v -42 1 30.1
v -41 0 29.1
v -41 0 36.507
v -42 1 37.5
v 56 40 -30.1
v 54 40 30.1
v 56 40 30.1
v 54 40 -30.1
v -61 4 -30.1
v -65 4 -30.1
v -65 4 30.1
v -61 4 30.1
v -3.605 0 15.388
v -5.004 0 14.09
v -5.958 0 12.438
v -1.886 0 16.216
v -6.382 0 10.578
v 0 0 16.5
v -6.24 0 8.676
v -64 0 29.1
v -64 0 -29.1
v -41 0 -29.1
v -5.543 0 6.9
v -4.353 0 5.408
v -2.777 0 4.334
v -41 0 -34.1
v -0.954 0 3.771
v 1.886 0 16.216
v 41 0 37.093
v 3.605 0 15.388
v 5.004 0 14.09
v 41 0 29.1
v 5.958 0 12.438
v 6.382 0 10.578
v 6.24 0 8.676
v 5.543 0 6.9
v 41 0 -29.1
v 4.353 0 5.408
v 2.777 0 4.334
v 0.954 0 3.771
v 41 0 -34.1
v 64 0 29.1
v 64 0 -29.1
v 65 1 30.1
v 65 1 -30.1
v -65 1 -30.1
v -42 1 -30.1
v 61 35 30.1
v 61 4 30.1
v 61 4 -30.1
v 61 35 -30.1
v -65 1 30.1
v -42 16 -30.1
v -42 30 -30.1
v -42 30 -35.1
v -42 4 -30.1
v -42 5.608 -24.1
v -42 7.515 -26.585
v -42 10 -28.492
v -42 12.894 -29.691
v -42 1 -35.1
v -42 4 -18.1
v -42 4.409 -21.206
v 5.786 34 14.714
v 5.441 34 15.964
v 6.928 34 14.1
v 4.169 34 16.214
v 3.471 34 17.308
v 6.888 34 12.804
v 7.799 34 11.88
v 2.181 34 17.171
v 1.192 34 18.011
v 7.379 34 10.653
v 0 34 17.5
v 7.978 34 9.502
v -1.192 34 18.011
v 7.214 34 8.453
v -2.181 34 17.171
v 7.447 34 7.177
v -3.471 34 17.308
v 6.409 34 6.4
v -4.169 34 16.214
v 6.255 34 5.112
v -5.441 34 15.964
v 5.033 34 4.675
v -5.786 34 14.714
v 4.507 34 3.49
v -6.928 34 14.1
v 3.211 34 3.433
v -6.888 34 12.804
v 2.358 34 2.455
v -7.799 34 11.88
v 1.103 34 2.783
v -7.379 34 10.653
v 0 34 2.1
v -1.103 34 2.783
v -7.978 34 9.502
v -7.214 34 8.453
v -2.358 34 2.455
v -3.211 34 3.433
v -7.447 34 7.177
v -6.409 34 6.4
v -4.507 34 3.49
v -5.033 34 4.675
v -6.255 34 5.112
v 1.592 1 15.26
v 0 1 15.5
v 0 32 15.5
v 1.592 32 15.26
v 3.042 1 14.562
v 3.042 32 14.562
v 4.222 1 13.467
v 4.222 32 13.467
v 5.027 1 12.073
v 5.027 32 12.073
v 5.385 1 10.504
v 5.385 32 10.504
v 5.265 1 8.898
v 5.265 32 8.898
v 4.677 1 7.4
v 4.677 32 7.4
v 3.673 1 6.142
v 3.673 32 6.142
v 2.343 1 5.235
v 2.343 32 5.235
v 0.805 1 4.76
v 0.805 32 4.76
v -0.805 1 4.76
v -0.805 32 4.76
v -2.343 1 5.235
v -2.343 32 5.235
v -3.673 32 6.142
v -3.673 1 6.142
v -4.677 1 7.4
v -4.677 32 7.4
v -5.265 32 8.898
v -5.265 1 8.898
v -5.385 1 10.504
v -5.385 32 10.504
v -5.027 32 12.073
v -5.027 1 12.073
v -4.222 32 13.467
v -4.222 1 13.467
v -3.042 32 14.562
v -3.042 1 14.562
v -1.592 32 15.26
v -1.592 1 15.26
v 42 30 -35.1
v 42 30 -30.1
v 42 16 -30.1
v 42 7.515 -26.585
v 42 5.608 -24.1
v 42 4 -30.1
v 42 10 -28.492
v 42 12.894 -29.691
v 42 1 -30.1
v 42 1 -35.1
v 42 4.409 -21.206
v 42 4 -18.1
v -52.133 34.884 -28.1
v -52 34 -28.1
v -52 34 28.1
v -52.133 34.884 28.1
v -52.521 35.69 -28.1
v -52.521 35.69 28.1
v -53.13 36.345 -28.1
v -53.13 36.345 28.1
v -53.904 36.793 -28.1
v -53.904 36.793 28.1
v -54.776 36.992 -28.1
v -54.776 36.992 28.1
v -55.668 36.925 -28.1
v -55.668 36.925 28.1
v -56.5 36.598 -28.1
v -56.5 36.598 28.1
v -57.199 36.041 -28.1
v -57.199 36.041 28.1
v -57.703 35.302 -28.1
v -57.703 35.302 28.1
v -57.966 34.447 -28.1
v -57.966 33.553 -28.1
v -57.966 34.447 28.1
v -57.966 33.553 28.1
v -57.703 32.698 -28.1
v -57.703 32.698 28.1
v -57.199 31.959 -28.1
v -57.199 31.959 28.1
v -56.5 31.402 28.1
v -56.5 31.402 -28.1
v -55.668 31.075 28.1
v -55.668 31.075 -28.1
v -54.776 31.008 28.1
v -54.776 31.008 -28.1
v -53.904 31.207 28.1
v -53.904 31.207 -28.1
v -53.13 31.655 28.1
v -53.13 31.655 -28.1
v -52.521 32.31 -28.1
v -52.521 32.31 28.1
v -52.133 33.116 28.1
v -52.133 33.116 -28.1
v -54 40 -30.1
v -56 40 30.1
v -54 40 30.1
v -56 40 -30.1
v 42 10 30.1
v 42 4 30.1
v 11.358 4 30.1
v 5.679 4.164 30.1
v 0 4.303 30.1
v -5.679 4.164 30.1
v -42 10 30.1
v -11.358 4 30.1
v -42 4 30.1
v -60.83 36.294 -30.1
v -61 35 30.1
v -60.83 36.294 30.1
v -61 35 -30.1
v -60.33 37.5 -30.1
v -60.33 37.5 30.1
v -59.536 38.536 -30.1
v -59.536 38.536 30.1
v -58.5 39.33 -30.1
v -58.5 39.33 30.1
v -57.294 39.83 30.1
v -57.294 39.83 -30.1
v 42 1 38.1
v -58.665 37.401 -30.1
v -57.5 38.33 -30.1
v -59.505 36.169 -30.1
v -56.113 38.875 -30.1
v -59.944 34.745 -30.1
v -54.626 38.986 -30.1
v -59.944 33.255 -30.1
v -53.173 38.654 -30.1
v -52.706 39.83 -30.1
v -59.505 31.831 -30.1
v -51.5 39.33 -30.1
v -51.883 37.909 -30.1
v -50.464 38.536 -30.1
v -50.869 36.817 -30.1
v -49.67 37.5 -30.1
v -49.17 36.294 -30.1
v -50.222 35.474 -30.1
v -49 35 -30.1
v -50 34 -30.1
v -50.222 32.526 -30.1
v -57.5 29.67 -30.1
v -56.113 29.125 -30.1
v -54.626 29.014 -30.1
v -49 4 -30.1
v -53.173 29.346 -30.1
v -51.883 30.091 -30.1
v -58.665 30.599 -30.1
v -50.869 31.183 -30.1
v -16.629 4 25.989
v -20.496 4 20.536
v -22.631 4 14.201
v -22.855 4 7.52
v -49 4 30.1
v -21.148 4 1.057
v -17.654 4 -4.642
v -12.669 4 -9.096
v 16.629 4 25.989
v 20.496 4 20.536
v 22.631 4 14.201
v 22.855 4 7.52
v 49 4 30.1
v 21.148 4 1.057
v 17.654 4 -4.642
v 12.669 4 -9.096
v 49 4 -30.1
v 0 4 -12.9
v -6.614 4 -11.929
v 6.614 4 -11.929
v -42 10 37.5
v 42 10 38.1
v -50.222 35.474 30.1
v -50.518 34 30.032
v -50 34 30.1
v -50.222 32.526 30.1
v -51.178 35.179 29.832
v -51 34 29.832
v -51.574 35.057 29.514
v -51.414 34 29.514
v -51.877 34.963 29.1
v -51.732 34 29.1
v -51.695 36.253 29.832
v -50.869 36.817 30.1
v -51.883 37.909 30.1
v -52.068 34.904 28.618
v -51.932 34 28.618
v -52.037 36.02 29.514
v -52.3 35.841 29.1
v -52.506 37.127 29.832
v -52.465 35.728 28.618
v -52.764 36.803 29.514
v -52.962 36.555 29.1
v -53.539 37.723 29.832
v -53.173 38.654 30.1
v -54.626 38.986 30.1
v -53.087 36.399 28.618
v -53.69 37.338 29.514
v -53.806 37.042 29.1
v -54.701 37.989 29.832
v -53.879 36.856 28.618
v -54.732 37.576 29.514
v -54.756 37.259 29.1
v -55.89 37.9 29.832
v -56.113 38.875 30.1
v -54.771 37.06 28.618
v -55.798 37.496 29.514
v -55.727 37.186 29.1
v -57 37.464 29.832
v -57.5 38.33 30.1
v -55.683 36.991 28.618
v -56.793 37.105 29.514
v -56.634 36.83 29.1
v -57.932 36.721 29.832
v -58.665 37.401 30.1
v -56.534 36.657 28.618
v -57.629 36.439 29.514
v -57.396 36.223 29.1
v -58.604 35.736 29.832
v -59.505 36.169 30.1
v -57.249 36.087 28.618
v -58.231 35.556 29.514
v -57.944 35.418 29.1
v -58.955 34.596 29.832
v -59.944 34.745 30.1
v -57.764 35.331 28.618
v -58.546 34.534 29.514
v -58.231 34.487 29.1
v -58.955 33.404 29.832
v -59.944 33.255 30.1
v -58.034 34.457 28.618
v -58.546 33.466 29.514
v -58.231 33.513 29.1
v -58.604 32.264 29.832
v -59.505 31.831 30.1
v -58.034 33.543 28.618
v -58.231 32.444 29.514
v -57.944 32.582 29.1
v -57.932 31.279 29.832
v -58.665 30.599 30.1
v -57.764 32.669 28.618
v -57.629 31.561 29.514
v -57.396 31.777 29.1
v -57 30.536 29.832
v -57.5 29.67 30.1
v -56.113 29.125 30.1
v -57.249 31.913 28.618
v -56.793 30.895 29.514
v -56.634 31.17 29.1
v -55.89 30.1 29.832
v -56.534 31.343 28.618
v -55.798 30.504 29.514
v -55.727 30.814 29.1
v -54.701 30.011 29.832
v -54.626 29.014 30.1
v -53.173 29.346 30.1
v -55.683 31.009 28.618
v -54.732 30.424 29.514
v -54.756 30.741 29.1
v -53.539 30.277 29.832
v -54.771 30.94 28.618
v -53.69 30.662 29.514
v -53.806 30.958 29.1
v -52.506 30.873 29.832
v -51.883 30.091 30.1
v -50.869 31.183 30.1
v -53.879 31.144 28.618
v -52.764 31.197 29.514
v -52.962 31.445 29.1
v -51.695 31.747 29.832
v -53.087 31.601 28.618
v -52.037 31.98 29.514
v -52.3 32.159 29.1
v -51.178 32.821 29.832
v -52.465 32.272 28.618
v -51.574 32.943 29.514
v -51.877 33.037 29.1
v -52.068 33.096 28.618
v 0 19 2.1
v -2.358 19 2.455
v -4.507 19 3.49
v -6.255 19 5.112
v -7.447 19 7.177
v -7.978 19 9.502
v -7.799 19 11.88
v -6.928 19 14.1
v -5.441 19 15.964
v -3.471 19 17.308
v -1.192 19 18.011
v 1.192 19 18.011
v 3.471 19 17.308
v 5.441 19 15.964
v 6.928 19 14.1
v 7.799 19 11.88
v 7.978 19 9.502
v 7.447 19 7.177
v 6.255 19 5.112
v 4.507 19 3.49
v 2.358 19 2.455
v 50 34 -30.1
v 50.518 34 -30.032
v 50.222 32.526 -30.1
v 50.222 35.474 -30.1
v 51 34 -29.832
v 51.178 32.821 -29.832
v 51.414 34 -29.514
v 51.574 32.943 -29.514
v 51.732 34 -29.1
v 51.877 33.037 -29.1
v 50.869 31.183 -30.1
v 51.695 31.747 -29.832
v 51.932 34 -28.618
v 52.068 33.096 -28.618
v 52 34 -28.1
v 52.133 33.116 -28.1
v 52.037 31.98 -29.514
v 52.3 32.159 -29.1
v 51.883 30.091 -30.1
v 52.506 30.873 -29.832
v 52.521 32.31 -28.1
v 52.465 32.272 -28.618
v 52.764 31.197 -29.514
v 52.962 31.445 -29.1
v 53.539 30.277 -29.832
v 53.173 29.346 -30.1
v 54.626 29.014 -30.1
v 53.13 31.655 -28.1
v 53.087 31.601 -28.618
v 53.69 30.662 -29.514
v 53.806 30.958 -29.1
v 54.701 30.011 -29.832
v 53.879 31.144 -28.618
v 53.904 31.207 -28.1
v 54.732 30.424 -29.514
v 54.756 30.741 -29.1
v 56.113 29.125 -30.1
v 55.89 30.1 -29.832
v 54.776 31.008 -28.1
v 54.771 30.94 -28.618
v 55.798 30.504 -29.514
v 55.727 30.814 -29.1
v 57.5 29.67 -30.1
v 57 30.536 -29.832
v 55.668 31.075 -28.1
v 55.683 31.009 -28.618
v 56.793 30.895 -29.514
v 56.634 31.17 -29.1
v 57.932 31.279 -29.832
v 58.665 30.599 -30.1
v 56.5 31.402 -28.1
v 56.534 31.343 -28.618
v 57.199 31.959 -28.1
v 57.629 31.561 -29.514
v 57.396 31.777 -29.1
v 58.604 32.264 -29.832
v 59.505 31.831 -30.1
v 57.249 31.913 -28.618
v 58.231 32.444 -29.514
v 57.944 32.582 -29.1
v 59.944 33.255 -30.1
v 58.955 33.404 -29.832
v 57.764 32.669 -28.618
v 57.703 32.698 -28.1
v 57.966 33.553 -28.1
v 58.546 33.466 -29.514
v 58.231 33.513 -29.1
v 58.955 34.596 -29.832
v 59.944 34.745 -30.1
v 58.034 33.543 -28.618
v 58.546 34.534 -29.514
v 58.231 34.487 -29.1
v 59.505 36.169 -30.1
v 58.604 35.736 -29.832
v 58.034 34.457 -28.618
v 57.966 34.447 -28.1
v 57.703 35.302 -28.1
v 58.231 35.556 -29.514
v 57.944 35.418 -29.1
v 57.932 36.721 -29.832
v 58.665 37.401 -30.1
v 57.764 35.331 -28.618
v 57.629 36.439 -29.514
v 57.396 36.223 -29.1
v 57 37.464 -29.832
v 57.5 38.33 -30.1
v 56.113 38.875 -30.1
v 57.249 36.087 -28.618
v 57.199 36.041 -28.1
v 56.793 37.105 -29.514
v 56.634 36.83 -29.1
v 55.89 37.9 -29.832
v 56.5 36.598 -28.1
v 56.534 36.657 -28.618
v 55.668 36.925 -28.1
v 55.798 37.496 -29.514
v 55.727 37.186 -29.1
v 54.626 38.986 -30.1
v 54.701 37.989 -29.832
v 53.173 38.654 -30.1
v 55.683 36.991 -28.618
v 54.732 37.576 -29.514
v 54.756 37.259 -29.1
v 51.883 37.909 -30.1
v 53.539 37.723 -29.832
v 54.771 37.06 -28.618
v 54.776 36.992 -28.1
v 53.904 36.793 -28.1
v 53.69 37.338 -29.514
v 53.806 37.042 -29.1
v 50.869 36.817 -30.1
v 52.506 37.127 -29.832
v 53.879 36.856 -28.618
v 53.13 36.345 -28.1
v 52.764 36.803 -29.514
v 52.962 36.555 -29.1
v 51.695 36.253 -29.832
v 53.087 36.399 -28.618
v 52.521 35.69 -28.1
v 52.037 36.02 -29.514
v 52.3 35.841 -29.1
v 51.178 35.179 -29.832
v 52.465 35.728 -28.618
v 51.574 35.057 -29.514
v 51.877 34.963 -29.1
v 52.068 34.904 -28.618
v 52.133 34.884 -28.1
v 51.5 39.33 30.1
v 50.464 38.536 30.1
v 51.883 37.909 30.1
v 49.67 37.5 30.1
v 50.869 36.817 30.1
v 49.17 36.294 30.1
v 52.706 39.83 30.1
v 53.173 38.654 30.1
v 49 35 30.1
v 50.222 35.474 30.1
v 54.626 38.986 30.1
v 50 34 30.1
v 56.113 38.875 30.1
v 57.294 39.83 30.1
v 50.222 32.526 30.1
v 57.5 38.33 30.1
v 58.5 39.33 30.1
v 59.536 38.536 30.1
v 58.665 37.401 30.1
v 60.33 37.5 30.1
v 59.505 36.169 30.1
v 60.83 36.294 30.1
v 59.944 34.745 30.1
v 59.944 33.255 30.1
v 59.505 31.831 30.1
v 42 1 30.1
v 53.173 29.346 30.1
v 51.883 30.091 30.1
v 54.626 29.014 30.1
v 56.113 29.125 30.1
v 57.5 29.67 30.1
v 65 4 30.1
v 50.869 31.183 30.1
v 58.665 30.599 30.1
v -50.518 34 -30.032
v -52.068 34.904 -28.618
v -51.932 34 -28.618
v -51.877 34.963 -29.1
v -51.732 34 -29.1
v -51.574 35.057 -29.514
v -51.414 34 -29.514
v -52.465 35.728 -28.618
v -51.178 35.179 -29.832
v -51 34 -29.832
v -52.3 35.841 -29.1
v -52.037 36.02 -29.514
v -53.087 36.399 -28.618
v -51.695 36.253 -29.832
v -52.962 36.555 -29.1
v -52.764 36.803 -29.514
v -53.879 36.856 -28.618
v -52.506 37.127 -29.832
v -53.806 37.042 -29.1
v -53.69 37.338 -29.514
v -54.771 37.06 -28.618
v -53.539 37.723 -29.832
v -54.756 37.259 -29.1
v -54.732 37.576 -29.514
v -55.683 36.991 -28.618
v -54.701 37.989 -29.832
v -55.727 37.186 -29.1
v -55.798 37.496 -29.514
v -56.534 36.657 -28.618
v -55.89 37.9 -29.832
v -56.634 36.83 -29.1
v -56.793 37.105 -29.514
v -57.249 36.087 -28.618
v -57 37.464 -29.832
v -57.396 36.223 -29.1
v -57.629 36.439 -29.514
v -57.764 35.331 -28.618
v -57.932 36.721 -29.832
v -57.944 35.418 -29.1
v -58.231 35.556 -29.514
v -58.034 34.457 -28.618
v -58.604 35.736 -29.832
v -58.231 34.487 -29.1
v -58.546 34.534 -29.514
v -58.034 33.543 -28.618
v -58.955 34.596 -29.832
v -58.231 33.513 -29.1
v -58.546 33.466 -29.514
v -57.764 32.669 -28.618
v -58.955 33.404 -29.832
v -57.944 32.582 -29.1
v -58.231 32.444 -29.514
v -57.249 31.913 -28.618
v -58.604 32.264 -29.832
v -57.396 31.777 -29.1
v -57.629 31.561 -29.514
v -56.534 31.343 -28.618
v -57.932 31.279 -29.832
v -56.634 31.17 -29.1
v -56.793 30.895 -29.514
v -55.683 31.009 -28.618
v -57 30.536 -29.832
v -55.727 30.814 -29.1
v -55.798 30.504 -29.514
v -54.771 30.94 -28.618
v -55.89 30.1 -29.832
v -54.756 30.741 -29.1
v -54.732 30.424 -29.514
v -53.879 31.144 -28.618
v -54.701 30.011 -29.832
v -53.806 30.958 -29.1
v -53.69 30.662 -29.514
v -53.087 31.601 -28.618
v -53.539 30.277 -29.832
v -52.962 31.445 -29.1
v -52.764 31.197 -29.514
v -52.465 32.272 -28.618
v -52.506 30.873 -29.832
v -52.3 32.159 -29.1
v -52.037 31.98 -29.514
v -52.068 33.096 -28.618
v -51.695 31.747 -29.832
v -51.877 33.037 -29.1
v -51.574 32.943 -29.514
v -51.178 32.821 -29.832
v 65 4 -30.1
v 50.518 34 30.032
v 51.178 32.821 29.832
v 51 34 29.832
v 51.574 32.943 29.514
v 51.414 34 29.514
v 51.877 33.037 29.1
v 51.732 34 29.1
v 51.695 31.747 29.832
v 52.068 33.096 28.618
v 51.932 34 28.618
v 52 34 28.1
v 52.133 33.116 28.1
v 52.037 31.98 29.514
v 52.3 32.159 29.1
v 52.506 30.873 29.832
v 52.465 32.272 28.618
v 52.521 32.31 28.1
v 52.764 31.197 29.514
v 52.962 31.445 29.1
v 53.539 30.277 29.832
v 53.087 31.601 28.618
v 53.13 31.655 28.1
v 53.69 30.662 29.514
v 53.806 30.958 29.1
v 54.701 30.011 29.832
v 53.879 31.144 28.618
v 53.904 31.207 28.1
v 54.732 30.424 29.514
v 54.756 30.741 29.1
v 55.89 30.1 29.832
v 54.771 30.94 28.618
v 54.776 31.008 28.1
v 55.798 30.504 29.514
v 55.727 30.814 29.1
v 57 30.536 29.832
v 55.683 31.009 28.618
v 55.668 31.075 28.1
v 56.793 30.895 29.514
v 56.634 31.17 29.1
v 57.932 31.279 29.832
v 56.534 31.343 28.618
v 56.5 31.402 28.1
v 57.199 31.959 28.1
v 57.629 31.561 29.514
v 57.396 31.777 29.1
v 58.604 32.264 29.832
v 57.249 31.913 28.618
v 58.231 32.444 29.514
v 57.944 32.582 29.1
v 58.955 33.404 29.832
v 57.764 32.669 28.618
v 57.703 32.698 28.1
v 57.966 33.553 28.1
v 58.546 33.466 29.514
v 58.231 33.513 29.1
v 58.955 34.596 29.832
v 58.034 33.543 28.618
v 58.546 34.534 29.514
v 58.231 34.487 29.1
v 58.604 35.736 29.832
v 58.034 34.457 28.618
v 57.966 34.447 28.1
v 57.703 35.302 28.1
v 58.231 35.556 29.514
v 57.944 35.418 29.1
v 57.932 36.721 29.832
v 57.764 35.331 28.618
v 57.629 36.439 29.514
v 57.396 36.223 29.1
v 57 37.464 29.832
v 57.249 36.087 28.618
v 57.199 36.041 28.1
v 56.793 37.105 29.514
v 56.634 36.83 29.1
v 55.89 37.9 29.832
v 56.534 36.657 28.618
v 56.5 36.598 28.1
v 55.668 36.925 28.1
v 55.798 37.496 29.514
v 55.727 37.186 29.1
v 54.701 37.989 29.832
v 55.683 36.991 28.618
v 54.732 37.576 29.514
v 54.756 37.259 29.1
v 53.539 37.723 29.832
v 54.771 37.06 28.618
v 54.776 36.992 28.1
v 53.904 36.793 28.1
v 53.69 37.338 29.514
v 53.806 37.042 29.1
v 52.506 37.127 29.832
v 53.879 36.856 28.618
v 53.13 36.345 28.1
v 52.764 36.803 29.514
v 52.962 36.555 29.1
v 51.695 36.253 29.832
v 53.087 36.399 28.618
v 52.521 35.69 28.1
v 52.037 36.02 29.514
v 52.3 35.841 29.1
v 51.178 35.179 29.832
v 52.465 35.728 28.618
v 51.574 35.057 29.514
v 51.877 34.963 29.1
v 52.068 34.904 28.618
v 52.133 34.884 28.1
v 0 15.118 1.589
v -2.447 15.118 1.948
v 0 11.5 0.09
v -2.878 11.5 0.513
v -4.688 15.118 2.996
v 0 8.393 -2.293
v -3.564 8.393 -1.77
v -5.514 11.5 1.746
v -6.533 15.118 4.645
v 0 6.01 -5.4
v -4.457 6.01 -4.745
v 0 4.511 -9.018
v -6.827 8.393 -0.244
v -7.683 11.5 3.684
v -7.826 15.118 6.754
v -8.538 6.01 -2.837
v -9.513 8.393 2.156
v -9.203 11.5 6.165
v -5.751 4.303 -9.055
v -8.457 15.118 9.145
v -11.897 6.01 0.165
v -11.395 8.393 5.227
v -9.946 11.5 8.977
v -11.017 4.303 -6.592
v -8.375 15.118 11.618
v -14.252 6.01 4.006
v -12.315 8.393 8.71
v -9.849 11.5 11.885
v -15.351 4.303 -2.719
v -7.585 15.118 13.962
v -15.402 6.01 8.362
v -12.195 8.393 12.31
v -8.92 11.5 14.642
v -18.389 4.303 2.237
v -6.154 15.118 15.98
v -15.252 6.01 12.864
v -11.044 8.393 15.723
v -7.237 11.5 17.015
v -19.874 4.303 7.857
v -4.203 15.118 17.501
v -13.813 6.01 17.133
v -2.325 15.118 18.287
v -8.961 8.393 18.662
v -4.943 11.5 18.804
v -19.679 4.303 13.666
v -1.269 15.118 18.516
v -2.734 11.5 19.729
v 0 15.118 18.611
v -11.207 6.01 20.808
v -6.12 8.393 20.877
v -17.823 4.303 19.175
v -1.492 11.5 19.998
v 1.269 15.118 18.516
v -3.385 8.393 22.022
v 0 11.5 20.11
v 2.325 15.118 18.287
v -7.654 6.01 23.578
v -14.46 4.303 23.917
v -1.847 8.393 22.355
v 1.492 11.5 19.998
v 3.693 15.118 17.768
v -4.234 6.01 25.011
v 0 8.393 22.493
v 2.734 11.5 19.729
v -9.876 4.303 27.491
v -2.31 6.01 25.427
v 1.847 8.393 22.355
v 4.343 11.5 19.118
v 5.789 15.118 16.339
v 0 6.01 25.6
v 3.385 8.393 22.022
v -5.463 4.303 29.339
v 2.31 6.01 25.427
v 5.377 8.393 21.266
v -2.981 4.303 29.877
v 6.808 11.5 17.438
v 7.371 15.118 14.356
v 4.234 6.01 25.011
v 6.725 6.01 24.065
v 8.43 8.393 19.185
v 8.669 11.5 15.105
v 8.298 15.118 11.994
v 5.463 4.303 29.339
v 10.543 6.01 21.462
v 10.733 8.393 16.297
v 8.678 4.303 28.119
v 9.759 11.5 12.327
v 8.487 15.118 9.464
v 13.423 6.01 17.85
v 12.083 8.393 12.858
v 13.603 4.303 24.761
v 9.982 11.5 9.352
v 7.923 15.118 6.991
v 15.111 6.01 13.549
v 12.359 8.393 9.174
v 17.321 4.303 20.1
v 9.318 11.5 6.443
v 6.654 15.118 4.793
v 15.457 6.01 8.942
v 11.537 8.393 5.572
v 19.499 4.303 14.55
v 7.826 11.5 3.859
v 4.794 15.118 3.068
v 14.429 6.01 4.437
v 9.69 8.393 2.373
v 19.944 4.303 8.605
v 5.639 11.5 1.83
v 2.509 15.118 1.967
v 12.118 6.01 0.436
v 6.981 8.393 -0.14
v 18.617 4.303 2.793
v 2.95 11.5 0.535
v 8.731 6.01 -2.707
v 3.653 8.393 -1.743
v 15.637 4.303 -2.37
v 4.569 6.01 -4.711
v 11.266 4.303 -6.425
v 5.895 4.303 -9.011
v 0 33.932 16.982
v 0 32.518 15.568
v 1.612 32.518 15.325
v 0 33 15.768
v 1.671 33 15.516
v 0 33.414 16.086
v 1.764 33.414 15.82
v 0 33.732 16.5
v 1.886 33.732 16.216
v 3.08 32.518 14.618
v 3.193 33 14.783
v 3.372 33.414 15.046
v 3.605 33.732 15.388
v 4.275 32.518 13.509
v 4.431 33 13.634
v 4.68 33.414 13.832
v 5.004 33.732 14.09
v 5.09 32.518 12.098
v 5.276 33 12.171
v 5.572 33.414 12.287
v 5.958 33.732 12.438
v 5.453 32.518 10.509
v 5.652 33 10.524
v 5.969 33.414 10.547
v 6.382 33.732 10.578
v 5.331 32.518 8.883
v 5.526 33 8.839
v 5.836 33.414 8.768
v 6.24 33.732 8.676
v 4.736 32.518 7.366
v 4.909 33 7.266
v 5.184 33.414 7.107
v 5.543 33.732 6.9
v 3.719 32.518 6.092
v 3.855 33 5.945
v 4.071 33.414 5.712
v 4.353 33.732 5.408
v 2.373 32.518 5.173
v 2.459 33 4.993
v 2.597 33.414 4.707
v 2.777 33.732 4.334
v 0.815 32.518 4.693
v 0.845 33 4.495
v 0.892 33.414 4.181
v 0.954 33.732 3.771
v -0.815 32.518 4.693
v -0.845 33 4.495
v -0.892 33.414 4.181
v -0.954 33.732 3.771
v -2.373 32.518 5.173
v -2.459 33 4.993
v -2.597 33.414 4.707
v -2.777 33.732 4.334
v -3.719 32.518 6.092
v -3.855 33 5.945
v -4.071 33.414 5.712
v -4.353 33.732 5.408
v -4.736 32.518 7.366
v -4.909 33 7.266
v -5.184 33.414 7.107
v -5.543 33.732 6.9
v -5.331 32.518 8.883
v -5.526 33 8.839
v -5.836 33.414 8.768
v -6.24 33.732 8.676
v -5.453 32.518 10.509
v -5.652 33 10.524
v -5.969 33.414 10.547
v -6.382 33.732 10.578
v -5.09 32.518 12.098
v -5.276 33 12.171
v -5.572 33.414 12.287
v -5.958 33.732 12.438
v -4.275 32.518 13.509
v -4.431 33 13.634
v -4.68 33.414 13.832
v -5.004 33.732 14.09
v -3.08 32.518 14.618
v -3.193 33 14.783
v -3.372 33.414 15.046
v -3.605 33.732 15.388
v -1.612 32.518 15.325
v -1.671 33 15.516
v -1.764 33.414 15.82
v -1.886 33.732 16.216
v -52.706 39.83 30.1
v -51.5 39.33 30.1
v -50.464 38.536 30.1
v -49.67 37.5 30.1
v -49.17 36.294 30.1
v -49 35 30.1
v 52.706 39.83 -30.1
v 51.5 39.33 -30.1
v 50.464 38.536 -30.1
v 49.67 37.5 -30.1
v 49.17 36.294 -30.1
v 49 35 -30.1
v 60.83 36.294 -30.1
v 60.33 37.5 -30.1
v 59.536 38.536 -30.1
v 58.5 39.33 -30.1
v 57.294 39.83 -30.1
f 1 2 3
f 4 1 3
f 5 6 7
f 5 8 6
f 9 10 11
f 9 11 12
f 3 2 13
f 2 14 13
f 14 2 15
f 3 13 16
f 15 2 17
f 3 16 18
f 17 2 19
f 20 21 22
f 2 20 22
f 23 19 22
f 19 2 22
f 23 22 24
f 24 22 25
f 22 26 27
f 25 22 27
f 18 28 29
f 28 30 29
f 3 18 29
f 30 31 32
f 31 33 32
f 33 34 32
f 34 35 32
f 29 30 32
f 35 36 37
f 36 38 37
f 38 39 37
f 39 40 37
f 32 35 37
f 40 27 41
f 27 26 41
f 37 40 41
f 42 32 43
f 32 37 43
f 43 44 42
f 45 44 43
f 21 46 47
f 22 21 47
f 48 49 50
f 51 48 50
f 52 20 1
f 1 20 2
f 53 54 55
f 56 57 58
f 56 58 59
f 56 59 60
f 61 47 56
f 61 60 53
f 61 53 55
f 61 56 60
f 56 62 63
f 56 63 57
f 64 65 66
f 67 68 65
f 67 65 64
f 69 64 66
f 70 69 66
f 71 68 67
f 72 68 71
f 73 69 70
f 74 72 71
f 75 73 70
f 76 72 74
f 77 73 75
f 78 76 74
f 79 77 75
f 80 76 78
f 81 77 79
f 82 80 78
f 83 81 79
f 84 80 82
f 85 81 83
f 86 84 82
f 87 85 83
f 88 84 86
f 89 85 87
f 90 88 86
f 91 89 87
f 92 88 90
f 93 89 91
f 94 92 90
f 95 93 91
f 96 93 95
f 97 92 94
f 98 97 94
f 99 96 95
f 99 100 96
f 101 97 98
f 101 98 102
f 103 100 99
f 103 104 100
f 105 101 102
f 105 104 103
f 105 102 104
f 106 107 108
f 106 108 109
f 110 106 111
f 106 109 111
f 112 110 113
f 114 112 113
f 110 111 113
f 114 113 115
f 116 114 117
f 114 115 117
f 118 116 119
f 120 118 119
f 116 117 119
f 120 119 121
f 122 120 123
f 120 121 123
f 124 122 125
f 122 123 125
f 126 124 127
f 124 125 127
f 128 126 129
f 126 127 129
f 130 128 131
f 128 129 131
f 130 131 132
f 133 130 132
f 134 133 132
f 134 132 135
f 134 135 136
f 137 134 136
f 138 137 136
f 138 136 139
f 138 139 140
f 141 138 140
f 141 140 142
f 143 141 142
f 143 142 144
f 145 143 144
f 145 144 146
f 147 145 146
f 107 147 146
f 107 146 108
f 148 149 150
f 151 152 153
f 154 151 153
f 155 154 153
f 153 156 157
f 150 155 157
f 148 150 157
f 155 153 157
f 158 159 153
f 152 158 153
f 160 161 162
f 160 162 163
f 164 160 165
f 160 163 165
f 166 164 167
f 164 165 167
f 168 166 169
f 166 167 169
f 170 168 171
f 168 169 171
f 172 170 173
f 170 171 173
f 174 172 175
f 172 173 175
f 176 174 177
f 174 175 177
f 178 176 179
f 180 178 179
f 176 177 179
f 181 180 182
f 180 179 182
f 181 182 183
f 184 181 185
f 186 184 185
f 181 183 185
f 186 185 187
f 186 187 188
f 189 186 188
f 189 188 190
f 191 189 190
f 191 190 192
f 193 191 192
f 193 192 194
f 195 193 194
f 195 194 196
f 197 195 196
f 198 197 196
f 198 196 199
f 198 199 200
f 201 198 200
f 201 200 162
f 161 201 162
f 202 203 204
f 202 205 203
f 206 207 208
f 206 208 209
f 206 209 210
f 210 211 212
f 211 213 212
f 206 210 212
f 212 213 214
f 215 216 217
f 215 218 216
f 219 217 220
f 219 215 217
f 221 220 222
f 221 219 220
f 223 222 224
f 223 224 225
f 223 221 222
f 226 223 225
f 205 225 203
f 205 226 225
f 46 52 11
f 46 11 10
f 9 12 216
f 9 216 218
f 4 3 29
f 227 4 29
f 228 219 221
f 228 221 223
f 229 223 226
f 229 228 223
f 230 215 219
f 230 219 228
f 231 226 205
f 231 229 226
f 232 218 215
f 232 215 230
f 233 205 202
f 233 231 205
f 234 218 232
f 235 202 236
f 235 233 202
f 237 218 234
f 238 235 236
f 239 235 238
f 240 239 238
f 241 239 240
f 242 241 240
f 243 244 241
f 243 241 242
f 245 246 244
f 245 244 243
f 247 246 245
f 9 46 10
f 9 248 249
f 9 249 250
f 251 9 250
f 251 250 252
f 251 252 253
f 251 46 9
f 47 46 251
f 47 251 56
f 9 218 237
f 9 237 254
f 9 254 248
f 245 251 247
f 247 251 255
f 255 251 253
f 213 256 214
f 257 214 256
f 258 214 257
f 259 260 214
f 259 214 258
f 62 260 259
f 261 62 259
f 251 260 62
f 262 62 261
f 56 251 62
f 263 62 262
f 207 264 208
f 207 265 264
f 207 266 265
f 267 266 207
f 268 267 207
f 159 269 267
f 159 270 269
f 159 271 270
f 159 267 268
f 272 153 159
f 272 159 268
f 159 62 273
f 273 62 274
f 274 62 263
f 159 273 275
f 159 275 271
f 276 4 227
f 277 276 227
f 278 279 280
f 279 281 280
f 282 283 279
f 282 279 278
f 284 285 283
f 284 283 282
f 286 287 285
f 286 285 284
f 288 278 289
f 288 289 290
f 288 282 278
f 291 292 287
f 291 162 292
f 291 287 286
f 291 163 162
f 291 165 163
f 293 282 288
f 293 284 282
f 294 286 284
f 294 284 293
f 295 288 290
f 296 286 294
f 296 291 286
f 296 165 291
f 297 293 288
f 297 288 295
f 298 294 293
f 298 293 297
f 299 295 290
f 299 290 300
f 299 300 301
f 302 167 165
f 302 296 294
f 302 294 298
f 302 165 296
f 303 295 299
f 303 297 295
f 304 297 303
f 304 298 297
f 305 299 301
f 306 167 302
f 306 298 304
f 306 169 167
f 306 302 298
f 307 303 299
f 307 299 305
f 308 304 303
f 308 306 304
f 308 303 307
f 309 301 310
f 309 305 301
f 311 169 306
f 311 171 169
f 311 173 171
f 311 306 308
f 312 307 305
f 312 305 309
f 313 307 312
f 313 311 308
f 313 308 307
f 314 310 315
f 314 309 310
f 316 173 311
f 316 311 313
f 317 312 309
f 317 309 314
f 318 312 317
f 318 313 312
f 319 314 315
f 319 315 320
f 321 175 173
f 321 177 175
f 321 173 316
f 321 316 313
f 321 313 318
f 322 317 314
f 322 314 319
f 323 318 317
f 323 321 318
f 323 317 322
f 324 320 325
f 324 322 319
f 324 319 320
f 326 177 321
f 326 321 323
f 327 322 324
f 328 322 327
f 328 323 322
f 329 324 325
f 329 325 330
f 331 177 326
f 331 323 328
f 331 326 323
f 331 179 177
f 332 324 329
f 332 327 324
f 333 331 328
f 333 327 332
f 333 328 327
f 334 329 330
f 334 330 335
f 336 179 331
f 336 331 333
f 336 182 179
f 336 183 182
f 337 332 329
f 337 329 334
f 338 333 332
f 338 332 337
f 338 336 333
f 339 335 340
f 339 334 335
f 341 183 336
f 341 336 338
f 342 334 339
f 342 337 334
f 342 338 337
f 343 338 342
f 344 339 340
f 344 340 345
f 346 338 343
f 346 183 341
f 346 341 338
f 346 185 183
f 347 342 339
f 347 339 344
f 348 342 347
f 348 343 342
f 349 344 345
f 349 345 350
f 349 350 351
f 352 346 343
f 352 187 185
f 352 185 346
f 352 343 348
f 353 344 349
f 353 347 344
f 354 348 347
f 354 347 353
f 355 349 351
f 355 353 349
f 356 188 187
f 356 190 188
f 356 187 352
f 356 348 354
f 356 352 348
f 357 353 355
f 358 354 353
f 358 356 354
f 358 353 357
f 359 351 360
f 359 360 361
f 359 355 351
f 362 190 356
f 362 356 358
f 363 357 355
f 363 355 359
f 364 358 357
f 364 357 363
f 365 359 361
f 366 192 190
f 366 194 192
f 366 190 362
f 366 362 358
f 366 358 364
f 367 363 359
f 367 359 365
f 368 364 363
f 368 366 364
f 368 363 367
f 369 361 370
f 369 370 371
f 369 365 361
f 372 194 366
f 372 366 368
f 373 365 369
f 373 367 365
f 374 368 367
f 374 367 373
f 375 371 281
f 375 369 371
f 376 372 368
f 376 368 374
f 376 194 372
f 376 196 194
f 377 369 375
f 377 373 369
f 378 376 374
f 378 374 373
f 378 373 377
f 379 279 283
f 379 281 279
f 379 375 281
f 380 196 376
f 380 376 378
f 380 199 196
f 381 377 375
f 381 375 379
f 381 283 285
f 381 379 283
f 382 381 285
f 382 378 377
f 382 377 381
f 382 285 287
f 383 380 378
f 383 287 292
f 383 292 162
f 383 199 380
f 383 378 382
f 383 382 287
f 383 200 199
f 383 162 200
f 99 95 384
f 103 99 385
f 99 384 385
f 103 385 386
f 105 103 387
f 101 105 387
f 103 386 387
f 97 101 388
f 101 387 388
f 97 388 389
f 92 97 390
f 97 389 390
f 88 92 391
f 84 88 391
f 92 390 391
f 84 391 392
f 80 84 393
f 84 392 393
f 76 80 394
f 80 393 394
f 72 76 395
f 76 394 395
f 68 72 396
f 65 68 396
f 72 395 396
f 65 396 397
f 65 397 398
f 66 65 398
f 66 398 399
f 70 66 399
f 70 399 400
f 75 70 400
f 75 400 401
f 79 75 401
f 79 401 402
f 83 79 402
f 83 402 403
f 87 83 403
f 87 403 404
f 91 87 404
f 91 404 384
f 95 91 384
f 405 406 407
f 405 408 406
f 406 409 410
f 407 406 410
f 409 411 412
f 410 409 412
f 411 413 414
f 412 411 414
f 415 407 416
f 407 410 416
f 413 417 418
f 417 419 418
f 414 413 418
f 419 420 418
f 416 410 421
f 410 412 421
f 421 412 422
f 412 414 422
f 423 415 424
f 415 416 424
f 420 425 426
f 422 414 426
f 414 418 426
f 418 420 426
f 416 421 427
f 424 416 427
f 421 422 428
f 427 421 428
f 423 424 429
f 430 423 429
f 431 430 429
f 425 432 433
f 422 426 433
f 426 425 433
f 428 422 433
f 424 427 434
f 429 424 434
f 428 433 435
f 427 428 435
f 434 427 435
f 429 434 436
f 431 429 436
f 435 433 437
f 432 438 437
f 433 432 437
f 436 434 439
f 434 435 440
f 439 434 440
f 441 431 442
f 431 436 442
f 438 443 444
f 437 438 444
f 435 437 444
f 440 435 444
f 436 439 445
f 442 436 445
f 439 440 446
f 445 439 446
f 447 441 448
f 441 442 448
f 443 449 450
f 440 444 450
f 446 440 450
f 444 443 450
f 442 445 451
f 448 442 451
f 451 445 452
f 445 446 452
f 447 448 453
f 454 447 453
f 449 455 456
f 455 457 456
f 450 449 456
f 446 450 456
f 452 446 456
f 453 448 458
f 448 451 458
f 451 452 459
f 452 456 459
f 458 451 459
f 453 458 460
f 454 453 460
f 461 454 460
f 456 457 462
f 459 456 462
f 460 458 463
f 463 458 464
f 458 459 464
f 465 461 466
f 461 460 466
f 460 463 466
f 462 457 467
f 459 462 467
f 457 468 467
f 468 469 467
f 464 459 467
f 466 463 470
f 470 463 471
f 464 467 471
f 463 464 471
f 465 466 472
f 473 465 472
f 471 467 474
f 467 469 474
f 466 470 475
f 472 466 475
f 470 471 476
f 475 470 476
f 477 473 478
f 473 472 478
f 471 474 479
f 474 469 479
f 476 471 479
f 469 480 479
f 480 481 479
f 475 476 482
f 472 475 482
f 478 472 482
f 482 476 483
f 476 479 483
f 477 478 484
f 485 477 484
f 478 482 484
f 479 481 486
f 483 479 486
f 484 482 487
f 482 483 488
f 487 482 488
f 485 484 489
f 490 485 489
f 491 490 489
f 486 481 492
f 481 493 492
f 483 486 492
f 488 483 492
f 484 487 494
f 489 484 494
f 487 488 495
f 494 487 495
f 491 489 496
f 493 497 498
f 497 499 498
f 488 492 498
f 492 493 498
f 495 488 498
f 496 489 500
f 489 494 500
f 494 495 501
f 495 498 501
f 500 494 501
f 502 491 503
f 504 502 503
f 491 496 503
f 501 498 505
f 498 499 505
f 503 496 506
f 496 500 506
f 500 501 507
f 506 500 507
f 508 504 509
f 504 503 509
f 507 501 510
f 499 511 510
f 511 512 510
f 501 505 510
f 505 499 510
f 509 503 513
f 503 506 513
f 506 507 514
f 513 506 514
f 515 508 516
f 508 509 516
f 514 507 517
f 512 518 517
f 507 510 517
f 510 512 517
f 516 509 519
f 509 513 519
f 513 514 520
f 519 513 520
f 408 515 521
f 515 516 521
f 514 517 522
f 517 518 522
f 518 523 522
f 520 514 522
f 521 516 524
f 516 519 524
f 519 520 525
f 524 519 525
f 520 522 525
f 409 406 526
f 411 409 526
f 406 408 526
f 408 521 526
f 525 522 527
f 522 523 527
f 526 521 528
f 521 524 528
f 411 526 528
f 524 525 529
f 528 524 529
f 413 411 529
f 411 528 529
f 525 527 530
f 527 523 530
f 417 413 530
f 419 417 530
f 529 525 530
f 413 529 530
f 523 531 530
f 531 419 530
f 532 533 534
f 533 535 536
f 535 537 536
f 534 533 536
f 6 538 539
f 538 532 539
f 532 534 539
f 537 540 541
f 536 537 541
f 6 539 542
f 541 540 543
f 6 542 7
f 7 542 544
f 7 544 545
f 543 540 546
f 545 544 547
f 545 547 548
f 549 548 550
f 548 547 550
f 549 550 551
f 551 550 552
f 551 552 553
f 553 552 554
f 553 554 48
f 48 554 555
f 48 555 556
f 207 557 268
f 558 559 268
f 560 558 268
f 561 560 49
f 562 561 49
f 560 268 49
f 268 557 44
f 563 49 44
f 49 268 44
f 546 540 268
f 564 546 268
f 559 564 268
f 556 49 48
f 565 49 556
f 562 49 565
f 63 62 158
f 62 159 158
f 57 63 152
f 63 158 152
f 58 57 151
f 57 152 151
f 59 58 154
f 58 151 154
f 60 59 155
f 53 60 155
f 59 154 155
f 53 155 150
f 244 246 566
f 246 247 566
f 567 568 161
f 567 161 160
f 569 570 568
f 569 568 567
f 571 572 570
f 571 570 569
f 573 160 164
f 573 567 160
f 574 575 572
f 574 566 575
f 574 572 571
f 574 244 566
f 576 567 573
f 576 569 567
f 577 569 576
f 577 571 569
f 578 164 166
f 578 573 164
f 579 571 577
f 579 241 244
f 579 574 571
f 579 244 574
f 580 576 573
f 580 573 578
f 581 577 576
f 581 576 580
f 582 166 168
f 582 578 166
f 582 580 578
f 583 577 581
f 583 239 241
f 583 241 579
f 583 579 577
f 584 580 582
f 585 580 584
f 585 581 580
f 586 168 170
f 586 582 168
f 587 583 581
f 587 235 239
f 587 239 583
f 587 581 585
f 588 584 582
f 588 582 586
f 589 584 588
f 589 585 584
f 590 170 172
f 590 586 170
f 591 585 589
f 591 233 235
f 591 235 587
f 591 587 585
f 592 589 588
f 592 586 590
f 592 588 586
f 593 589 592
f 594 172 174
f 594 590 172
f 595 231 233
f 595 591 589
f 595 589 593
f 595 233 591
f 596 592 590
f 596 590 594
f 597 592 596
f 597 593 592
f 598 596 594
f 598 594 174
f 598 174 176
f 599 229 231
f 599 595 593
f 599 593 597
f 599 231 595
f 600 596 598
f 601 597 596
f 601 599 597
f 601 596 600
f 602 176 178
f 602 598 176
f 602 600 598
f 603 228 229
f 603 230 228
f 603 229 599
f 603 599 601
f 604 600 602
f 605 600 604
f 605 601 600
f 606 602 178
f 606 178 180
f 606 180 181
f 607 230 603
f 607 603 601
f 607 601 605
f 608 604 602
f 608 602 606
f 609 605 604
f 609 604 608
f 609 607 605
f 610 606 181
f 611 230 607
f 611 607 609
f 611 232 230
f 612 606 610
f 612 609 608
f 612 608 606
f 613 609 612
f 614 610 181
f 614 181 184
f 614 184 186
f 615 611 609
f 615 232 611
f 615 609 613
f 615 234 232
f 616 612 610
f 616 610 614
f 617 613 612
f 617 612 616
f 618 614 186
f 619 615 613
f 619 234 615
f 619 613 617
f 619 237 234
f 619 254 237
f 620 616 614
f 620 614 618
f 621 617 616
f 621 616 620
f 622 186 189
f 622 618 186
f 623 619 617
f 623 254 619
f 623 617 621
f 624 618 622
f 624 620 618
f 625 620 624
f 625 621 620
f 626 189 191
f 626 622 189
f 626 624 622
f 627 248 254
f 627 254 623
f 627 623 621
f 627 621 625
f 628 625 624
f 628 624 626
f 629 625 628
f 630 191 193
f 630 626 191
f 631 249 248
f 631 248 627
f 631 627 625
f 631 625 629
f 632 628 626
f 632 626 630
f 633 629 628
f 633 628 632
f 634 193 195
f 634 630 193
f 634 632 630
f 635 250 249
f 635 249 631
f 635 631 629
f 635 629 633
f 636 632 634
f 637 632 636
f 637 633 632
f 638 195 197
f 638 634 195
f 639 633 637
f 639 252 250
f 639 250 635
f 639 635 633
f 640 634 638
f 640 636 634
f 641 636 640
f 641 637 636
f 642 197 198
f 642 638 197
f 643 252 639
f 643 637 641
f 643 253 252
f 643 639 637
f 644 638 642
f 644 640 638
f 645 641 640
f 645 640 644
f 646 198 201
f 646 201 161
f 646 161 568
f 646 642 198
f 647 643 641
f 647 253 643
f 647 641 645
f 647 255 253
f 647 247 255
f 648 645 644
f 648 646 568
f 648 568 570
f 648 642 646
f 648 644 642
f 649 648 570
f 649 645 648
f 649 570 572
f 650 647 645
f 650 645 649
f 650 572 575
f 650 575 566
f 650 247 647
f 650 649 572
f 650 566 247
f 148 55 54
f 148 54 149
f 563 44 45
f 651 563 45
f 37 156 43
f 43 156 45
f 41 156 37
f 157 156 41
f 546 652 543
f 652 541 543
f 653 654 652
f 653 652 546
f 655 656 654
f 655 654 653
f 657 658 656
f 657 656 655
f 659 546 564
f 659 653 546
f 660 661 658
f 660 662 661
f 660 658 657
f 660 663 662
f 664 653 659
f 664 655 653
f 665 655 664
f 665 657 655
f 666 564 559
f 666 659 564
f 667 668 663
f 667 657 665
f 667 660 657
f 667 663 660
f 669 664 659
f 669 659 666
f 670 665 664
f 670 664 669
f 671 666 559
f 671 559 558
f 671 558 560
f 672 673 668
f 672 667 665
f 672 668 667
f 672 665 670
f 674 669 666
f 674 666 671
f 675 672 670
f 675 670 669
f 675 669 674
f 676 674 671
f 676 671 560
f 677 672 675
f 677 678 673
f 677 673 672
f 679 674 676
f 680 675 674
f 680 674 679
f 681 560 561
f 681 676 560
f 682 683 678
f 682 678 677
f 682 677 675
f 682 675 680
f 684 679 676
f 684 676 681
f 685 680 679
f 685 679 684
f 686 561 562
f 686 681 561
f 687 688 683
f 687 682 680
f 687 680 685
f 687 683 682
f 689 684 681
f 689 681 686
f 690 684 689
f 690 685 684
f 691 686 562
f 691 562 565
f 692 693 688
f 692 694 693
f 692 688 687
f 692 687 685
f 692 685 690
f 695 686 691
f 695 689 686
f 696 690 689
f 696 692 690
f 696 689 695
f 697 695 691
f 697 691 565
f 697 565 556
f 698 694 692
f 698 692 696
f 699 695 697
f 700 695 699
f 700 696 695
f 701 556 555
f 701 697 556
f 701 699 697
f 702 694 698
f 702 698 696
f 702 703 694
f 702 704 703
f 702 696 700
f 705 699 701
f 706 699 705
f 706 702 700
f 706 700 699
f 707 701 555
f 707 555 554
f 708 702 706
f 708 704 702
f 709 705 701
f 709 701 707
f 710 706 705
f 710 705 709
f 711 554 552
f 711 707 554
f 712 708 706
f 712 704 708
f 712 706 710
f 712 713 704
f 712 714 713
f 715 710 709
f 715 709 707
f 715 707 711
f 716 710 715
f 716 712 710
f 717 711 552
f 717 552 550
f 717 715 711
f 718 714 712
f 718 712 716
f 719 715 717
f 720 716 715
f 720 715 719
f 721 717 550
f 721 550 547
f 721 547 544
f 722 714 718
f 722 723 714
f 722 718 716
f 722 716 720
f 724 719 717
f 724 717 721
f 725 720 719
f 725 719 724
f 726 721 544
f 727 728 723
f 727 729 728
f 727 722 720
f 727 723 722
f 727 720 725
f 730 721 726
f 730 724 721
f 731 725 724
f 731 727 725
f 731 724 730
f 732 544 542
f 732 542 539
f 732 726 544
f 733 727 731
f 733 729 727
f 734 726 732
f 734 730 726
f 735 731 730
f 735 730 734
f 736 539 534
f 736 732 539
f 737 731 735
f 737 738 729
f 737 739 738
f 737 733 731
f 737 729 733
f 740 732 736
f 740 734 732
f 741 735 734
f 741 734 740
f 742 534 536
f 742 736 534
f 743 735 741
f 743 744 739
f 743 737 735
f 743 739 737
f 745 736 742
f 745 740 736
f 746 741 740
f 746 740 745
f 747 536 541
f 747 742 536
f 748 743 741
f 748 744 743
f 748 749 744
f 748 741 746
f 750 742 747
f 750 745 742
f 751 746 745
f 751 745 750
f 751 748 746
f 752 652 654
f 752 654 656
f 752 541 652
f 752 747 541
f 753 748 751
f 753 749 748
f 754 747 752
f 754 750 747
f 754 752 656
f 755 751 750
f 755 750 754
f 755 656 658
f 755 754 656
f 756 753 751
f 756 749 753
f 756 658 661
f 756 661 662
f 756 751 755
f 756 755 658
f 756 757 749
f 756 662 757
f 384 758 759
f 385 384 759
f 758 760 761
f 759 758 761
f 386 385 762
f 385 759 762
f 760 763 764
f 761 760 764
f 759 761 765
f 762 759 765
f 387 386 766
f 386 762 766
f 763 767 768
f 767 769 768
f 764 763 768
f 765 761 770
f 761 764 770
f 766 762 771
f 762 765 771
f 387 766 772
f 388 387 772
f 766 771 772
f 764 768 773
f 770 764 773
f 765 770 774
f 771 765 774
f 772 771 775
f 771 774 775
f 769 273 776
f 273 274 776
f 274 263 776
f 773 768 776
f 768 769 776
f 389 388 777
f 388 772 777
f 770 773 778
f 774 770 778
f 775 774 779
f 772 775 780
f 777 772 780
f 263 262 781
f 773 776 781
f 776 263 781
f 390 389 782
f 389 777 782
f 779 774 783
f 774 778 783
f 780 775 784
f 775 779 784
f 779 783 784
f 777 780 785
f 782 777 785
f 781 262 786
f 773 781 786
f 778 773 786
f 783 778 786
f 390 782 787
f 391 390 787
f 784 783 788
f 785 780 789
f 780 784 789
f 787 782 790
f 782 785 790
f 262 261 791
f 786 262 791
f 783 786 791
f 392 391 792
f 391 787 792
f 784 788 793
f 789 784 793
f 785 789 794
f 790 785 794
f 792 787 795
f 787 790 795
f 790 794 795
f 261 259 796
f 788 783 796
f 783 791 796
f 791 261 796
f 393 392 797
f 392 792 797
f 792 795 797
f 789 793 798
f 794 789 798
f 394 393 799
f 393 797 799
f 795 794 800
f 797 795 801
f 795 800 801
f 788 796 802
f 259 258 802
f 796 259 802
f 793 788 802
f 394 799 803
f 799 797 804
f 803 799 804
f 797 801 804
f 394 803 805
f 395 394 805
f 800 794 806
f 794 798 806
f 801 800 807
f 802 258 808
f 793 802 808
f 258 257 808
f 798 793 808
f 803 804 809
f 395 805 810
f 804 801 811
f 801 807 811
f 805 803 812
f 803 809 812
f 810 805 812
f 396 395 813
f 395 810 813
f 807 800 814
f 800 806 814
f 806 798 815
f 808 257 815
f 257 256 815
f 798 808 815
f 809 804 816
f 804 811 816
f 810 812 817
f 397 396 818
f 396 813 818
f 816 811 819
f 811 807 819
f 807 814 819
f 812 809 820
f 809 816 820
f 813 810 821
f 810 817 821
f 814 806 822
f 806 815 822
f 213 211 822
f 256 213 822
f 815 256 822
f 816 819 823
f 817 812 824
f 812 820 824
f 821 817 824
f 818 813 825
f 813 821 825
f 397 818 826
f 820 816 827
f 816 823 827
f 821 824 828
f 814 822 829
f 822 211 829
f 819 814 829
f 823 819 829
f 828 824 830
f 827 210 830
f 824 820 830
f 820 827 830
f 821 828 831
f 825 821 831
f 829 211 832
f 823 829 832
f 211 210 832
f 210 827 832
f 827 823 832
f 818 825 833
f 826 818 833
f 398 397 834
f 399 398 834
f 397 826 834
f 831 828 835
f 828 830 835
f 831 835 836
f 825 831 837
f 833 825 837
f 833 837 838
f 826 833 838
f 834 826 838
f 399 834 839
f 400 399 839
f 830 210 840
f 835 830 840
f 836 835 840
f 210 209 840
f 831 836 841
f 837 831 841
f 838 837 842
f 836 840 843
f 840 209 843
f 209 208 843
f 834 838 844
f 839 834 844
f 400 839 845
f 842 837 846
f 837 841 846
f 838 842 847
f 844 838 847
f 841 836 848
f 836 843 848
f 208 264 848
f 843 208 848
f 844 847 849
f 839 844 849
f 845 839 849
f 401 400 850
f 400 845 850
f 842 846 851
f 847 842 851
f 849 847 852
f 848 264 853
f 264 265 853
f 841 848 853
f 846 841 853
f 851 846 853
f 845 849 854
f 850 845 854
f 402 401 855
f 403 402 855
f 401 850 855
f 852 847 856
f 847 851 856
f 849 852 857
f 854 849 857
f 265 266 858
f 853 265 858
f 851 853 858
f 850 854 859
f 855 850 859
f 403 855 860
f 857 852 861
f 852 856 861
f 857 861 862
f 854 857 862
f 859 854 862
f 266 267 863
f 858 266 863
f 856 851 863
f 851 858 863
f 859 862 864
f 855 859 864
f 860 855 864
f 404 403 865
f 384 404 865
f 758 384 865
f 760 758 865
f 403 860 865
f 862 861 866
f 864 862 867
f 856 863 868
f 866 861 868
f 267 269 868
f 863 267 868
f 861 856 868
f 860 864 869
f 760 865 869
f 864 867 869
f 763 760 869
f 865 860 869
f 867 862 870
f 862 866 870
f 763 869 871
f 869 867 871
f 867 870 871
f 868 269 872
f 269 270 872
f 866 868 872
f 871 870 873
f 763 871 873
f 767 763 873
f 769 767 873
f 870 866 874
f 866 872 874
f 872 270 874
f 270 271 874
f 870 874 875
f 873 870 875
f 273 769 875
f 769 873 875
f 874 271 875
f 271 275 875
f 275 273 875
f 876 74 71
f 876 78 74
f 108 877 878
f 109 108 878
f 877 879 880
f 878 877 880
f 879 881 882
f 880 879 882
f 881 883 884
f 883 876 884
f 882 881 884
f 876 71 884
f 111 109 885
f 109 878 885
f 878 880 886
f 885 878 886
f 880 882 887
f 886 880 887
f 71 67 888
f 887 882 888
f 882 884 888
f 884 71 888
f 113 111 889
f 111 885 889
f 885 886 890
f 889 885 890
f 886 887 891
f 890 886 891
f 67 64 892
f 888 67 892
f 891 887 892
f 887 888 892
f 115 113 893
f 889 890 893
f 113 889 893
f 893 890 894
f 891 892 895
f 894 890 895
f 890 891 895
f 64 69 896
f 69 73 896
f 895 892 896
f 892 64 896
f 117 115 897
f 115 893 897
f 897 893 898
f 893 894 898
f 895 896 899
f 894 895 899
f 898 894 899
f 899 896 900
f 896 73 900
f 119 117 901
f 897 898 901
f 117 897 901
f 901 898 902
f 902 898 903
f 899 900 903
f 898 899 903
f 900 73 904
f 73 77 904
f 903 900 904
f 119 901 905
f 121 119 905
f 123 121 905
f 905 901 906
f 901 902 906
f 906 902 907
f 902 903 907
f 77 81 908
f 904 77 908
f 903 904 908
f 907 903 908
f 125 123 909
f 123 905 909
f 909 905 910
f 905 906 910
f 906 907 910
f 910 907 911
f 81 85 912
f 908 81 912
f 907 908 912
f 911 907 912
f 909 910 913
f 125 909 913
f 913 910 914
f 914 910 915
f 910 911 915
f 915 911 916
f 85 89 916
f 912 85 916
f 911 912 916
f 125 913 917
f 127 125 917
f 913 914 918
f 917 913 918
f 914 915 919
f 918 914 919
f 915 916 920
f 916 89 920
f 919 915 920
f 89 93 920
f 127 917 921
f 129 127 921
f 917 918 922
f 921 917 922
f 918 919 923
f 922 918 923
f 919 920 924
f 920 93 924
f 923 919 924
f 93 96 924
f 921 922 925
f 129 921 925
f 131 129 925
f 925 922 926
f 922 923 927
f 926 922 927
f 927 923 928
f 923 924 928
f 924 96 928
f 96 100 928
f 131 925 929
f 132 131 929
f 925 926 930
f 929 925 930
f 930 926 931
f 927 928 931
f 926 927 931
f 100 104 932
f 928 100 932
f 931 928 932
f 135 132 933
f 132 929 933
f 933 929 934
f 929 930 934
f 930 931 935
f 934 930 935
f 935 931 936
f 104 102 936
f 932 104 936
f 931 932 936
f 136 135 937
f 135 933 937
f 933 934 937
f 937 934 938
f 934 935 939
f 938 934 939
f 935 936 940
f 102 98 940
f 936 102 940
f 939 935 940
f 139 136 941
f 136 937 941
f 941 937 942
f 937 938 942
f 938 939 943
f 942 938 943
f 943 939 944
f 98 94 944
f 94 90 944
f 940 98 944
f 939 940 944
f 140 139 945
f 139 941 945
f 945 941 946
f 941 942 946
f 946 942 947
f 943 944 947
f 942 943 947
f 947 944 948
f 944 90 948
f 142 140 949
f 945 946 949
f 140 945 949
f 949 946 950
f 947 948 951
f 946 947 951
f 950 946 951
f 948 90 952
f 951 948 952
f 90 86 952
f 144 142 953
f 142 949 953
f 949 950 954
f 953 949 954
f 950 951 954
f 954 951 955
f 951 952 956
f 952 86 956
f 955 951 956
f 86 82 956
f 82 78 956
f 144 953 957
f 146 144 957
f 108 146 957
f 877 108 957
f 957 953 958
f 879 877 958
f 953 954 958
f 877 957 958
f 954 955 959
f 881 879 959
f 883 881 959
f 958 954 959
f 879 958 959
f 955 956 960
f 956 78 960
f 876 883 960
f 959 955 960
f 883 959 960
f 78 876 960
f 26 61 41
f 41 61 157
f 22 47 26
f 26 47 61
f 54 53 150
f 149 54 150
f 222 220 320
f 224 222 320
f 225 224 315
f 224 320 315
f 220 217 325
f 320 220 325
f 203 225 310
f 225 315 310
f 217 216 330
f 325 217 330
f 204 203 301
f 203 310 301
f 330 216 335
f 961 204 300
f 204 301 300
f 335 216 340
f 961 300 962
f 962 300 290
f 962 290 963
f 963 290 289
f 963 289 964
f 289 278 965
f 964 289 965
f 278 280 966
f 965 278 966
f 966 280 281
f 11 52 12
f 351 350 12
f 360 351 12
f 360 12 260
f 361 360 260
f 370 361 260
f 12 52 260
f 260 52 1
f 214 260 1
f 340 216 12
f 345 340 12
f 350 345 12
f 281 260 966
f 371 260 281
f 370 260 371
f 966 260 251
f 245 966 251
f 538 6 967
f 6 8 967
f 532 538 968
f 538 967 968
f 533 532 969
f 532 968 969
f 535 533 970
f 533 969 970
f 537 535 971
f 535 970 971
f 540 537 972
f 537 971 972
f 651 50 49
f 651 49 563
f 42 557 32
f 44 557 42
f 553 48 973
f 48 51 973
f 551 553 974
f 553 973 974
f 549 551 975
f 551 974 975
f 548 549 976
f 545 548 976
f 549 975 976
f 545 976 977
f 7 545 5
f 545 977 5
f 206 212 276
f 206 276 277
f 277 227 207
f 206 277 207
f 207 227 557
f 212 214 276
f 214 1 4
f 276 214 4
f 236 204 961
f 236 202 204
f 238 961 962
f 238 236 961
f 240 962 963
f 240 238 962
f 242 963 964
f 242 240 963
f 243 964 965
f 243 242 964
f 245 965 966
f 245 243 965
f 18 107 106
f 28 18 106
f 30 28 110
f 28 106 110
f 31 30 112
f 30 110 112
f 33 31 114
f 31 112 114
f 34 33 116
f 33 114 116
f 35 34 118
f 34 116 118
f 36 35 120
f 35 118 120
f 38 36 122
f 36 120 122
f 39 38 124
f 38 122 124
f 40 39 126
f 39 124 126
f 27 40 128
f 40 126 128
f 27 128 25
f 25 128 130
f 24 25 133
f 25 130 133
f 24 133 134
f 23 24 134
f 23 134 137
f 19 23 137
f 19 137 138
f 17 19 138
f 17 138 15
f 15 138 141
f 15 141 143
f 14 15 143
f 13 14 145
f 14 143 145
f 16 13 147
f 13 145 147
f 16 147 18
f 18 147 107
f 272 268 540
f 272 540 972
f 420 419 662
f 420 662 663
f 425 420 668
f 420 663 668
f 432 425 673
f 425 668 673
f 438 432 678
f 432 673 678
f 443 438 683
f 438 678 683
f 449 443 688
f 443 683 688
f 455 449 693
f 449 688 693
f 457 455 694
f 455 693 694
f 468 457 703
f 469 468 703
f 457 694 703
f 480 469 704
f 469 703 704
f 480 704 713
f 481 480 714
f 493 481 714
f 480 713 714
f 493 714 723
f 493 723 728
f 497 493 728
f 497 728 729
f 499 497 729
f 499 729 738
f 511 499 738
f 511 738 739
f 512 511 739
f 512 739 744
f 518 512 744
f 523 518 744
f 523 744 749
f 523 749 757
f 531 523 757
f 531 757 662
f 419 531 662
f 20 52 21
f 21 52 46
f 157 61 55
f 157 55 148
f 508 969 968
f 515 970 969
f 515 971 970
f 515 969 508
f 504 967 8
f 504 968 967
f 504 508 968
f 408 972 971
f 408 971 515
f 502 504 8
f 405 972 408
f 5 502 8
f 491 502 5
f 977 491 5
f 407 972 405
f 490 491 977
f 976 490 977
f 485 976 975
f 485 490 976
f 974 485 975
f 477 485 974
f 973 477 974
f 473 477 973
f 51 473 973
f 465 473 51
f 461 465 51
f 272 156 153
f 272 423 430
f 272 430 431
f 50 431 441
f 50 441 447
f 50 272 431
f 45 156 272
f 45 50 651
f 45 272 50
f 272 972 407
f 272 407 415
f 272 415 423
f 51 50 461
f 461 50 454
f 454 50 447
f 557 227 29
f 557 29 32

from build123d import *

# Parameters (mm, degrees)
SKETCH_1_W          = 130
SKETCH_1_H          = 60.2
EXTRUDE_1_DEPTH     = 4
SKETCH_2_W          = 12
SKETCH_2_H          = 60.2
EXTRUDE_2_DEPTH     = 36
SKETCH_4_R          = 3
CUT_EXTRUDE_1_DEPTH = 98.206172644
FILLET_1_R          = 5
SKETCH_5_R          = 8
EXTRUDE_3_DEPTH     = 30
SKETCH_6_R          = 5.4
CUT_EXTRUDE_2_DEPTH = 80.290667799
FILLET_3_R          = 2
SKETCH_8_W          = 84
SKETCH_8_H          = 5
EXTRUDE_4_DEPTH     = 30
EXTRUDE_5_DEPTH     = 10
CHAMFER_2_SIZE      = 1
FILLET_5_R          = 2
FILLET_6_R          = 12
FILLET_2_R          = 15


with BuildPart() as part:
    # Эскиз1 → Бобышка-Вытянуть1 (new body)
    with BuildSketch(Plane(origin=(0, 0, 0), x_dir=(1, 0, 0), z_dir=(0, 1, 0))):
        Rectangle(SKETCH_1_W, SKETCH_1_H)
    extrude(amount=EXTRUDE_1_DEPTH)

    # Эскиз2 → Бобышка-Вытянуть2 (add)
    with BuildSketch(Plane(origin=(0, 4, 0), x_dir=(1, 0, 0), z_dir=(0, 1, 0))):
        with Locations((-55, 0)):
            Rectangle(SKETCH_2_W, SKETCH_2_H)
        with Locations((55, 0)):
            Rectangle(SKETCH_2_W, SKETCH_2_H)
    extrude(amount=EXTRUDE_2_DEPTH)

    # Эскиз4 → Вырез-Вытянуть1 (cut, through all)
    with BuildSketch(Plane.XY.offset(30.1)):
        with Locations((-55, 34)):
            Circle(SKETCH_4_R)
        with Locations(Location((55, 34, 0), (0, 0, 180))):
            Circle(SKETCH_4_R)
    extrude(amount=-CUT_EXTRUDE_1_DEPTH, mode=Mode.SUBTRACT)

    # Скругление1
    fillet_1_edges = [part.edges().sort_by_distance(p)[0] for p in [
        (-49, 40, 0),
        (-61, 40, 0),
        (61, 40, 0),
        (49, 40, 0),
    ]]
    fillet(fillet_1_edges, radius=FILLET_1_R)

    # Эскиз5 → Бобышка-Вытянуть3 (add)
    with BuildSketch(Plane(origin=(0, 4, 0), x_dir=(1, 0, 0), z_dir=(0, 1, 0))):
        with Locations(Location((0, -10.1, 0), (0, 0, 90))):
            Circle(SKETCH_5_R)
    extrude(amount=EXTRUDE_3_DEPTH)

    # Эскиз6 → Вырез-Вытянуть2 (cut, through all)
    with BuildSketch(Plane(origin=(0, 34, 0), x_dir=(1, 0, 0), z_dir=(0, 1, 0))):
        with Locations(Location((0, -10.1, 0), (0, 0, 270))):
            Circle(SKETCH_6_R)
    extrude(amount=-CUT_EXTRUDE_2_DEPTH, mode=Mode.SUBTRACT)

    # Скругление3
    fillet_3_edges = [part.edges().sort_by_distance(p)[0] for p in [
        (0, 34, 4.7),
    ]]
    fillet(fillet_3_edges, radius=FILLET_3_R)

    # Эскиз8 → Бобышка-Вытянуть4 (add)
    with BuildSketch(Plane(origin=(0, 0, 0), x_dir=(1, 0, 0), z_dir=(0, 1, 0))):
        with Locations((0, 32.6)):
            Rectangle(SKETCH_8_W, SKETCH_8_H)
    extrude(amount=EXTRUDE_4_DEPTH)

    # Эскиз8<3> → Бобышка-Вытянуть5 (add)
    with BuildSketch(Plane(origin=(0, 0, 0), x_dir=(1, 0, 0), z_dir=(0, 1, 0))):
        Polygon((-42, -30.1), (-42, -37.5), (42, -38.1), (42, -30.1), align=None)
    extrude(amount=EXTRUDE_5_DEPTH)

    # Фаска2
    chamfer_2_edges = [part.edges().sort_by_distance(p)[0] for p in [
        (53.5, 0, 30.1),
        (-42, 0, 33.8),
        (0, 0, 37.8),
        (42, 0, 34.1),
        (-53.5, 0, 30.1),
        (-65, 0, 0),
        (53.5, 0, -30.1),
        (65, 0, 0),
        (0, 0, 4.7),
        (-53.5, 0, -30.1),
        (42, 0, -32.6),
        (-42, 0, -32.6),
        (0, 0, -35.1),
    ]]
    chamfer(chamfer_2_edges, length=CHAMFER_2_SIZE)

    # Скругление5
    fillet_5_edges = [part.edges().sort_by_distance(p)[0] for p in [
        (-58, 34, -30.1),
        (-58, 34, 30.1),
        (58, 34, -30.1),
        (58, 34, 30.1),
    ]]
    fillet(fillet_5_edges, radius=FILLET_5_R)

    # Скругление6
    fillet_6_edges = [part.edges().sort_by_distance(p)[0] for p in [
        (0, 4, -30.1),
    ]]
    fillet(fillet_6_edges, radius=FILLET_6_R)

    # Скругление2
    # the kernel refuses this fillet: 15 mm, written as the material it adds along each edge
    with BuildSketch(Plane(origin=(0, 4, 10.1), x_dir=(0, 0, -1), z_dir=(1, 0, 0))) as fillet_2_piece_1:
        with BuildLine():
            CenterArc((8 + FILLET_2_R, FILLET_2_R), FILLET_2_R, 180, 90)
            Line((8, FILLET_2_R), (8, 0))
            Line((8, 0), (8 + FILLET_2_R, 0))
        make_face()
    revolve(axis=Axis((0, 4, 10.1), (0, 1, 0)))


solid = part.part
